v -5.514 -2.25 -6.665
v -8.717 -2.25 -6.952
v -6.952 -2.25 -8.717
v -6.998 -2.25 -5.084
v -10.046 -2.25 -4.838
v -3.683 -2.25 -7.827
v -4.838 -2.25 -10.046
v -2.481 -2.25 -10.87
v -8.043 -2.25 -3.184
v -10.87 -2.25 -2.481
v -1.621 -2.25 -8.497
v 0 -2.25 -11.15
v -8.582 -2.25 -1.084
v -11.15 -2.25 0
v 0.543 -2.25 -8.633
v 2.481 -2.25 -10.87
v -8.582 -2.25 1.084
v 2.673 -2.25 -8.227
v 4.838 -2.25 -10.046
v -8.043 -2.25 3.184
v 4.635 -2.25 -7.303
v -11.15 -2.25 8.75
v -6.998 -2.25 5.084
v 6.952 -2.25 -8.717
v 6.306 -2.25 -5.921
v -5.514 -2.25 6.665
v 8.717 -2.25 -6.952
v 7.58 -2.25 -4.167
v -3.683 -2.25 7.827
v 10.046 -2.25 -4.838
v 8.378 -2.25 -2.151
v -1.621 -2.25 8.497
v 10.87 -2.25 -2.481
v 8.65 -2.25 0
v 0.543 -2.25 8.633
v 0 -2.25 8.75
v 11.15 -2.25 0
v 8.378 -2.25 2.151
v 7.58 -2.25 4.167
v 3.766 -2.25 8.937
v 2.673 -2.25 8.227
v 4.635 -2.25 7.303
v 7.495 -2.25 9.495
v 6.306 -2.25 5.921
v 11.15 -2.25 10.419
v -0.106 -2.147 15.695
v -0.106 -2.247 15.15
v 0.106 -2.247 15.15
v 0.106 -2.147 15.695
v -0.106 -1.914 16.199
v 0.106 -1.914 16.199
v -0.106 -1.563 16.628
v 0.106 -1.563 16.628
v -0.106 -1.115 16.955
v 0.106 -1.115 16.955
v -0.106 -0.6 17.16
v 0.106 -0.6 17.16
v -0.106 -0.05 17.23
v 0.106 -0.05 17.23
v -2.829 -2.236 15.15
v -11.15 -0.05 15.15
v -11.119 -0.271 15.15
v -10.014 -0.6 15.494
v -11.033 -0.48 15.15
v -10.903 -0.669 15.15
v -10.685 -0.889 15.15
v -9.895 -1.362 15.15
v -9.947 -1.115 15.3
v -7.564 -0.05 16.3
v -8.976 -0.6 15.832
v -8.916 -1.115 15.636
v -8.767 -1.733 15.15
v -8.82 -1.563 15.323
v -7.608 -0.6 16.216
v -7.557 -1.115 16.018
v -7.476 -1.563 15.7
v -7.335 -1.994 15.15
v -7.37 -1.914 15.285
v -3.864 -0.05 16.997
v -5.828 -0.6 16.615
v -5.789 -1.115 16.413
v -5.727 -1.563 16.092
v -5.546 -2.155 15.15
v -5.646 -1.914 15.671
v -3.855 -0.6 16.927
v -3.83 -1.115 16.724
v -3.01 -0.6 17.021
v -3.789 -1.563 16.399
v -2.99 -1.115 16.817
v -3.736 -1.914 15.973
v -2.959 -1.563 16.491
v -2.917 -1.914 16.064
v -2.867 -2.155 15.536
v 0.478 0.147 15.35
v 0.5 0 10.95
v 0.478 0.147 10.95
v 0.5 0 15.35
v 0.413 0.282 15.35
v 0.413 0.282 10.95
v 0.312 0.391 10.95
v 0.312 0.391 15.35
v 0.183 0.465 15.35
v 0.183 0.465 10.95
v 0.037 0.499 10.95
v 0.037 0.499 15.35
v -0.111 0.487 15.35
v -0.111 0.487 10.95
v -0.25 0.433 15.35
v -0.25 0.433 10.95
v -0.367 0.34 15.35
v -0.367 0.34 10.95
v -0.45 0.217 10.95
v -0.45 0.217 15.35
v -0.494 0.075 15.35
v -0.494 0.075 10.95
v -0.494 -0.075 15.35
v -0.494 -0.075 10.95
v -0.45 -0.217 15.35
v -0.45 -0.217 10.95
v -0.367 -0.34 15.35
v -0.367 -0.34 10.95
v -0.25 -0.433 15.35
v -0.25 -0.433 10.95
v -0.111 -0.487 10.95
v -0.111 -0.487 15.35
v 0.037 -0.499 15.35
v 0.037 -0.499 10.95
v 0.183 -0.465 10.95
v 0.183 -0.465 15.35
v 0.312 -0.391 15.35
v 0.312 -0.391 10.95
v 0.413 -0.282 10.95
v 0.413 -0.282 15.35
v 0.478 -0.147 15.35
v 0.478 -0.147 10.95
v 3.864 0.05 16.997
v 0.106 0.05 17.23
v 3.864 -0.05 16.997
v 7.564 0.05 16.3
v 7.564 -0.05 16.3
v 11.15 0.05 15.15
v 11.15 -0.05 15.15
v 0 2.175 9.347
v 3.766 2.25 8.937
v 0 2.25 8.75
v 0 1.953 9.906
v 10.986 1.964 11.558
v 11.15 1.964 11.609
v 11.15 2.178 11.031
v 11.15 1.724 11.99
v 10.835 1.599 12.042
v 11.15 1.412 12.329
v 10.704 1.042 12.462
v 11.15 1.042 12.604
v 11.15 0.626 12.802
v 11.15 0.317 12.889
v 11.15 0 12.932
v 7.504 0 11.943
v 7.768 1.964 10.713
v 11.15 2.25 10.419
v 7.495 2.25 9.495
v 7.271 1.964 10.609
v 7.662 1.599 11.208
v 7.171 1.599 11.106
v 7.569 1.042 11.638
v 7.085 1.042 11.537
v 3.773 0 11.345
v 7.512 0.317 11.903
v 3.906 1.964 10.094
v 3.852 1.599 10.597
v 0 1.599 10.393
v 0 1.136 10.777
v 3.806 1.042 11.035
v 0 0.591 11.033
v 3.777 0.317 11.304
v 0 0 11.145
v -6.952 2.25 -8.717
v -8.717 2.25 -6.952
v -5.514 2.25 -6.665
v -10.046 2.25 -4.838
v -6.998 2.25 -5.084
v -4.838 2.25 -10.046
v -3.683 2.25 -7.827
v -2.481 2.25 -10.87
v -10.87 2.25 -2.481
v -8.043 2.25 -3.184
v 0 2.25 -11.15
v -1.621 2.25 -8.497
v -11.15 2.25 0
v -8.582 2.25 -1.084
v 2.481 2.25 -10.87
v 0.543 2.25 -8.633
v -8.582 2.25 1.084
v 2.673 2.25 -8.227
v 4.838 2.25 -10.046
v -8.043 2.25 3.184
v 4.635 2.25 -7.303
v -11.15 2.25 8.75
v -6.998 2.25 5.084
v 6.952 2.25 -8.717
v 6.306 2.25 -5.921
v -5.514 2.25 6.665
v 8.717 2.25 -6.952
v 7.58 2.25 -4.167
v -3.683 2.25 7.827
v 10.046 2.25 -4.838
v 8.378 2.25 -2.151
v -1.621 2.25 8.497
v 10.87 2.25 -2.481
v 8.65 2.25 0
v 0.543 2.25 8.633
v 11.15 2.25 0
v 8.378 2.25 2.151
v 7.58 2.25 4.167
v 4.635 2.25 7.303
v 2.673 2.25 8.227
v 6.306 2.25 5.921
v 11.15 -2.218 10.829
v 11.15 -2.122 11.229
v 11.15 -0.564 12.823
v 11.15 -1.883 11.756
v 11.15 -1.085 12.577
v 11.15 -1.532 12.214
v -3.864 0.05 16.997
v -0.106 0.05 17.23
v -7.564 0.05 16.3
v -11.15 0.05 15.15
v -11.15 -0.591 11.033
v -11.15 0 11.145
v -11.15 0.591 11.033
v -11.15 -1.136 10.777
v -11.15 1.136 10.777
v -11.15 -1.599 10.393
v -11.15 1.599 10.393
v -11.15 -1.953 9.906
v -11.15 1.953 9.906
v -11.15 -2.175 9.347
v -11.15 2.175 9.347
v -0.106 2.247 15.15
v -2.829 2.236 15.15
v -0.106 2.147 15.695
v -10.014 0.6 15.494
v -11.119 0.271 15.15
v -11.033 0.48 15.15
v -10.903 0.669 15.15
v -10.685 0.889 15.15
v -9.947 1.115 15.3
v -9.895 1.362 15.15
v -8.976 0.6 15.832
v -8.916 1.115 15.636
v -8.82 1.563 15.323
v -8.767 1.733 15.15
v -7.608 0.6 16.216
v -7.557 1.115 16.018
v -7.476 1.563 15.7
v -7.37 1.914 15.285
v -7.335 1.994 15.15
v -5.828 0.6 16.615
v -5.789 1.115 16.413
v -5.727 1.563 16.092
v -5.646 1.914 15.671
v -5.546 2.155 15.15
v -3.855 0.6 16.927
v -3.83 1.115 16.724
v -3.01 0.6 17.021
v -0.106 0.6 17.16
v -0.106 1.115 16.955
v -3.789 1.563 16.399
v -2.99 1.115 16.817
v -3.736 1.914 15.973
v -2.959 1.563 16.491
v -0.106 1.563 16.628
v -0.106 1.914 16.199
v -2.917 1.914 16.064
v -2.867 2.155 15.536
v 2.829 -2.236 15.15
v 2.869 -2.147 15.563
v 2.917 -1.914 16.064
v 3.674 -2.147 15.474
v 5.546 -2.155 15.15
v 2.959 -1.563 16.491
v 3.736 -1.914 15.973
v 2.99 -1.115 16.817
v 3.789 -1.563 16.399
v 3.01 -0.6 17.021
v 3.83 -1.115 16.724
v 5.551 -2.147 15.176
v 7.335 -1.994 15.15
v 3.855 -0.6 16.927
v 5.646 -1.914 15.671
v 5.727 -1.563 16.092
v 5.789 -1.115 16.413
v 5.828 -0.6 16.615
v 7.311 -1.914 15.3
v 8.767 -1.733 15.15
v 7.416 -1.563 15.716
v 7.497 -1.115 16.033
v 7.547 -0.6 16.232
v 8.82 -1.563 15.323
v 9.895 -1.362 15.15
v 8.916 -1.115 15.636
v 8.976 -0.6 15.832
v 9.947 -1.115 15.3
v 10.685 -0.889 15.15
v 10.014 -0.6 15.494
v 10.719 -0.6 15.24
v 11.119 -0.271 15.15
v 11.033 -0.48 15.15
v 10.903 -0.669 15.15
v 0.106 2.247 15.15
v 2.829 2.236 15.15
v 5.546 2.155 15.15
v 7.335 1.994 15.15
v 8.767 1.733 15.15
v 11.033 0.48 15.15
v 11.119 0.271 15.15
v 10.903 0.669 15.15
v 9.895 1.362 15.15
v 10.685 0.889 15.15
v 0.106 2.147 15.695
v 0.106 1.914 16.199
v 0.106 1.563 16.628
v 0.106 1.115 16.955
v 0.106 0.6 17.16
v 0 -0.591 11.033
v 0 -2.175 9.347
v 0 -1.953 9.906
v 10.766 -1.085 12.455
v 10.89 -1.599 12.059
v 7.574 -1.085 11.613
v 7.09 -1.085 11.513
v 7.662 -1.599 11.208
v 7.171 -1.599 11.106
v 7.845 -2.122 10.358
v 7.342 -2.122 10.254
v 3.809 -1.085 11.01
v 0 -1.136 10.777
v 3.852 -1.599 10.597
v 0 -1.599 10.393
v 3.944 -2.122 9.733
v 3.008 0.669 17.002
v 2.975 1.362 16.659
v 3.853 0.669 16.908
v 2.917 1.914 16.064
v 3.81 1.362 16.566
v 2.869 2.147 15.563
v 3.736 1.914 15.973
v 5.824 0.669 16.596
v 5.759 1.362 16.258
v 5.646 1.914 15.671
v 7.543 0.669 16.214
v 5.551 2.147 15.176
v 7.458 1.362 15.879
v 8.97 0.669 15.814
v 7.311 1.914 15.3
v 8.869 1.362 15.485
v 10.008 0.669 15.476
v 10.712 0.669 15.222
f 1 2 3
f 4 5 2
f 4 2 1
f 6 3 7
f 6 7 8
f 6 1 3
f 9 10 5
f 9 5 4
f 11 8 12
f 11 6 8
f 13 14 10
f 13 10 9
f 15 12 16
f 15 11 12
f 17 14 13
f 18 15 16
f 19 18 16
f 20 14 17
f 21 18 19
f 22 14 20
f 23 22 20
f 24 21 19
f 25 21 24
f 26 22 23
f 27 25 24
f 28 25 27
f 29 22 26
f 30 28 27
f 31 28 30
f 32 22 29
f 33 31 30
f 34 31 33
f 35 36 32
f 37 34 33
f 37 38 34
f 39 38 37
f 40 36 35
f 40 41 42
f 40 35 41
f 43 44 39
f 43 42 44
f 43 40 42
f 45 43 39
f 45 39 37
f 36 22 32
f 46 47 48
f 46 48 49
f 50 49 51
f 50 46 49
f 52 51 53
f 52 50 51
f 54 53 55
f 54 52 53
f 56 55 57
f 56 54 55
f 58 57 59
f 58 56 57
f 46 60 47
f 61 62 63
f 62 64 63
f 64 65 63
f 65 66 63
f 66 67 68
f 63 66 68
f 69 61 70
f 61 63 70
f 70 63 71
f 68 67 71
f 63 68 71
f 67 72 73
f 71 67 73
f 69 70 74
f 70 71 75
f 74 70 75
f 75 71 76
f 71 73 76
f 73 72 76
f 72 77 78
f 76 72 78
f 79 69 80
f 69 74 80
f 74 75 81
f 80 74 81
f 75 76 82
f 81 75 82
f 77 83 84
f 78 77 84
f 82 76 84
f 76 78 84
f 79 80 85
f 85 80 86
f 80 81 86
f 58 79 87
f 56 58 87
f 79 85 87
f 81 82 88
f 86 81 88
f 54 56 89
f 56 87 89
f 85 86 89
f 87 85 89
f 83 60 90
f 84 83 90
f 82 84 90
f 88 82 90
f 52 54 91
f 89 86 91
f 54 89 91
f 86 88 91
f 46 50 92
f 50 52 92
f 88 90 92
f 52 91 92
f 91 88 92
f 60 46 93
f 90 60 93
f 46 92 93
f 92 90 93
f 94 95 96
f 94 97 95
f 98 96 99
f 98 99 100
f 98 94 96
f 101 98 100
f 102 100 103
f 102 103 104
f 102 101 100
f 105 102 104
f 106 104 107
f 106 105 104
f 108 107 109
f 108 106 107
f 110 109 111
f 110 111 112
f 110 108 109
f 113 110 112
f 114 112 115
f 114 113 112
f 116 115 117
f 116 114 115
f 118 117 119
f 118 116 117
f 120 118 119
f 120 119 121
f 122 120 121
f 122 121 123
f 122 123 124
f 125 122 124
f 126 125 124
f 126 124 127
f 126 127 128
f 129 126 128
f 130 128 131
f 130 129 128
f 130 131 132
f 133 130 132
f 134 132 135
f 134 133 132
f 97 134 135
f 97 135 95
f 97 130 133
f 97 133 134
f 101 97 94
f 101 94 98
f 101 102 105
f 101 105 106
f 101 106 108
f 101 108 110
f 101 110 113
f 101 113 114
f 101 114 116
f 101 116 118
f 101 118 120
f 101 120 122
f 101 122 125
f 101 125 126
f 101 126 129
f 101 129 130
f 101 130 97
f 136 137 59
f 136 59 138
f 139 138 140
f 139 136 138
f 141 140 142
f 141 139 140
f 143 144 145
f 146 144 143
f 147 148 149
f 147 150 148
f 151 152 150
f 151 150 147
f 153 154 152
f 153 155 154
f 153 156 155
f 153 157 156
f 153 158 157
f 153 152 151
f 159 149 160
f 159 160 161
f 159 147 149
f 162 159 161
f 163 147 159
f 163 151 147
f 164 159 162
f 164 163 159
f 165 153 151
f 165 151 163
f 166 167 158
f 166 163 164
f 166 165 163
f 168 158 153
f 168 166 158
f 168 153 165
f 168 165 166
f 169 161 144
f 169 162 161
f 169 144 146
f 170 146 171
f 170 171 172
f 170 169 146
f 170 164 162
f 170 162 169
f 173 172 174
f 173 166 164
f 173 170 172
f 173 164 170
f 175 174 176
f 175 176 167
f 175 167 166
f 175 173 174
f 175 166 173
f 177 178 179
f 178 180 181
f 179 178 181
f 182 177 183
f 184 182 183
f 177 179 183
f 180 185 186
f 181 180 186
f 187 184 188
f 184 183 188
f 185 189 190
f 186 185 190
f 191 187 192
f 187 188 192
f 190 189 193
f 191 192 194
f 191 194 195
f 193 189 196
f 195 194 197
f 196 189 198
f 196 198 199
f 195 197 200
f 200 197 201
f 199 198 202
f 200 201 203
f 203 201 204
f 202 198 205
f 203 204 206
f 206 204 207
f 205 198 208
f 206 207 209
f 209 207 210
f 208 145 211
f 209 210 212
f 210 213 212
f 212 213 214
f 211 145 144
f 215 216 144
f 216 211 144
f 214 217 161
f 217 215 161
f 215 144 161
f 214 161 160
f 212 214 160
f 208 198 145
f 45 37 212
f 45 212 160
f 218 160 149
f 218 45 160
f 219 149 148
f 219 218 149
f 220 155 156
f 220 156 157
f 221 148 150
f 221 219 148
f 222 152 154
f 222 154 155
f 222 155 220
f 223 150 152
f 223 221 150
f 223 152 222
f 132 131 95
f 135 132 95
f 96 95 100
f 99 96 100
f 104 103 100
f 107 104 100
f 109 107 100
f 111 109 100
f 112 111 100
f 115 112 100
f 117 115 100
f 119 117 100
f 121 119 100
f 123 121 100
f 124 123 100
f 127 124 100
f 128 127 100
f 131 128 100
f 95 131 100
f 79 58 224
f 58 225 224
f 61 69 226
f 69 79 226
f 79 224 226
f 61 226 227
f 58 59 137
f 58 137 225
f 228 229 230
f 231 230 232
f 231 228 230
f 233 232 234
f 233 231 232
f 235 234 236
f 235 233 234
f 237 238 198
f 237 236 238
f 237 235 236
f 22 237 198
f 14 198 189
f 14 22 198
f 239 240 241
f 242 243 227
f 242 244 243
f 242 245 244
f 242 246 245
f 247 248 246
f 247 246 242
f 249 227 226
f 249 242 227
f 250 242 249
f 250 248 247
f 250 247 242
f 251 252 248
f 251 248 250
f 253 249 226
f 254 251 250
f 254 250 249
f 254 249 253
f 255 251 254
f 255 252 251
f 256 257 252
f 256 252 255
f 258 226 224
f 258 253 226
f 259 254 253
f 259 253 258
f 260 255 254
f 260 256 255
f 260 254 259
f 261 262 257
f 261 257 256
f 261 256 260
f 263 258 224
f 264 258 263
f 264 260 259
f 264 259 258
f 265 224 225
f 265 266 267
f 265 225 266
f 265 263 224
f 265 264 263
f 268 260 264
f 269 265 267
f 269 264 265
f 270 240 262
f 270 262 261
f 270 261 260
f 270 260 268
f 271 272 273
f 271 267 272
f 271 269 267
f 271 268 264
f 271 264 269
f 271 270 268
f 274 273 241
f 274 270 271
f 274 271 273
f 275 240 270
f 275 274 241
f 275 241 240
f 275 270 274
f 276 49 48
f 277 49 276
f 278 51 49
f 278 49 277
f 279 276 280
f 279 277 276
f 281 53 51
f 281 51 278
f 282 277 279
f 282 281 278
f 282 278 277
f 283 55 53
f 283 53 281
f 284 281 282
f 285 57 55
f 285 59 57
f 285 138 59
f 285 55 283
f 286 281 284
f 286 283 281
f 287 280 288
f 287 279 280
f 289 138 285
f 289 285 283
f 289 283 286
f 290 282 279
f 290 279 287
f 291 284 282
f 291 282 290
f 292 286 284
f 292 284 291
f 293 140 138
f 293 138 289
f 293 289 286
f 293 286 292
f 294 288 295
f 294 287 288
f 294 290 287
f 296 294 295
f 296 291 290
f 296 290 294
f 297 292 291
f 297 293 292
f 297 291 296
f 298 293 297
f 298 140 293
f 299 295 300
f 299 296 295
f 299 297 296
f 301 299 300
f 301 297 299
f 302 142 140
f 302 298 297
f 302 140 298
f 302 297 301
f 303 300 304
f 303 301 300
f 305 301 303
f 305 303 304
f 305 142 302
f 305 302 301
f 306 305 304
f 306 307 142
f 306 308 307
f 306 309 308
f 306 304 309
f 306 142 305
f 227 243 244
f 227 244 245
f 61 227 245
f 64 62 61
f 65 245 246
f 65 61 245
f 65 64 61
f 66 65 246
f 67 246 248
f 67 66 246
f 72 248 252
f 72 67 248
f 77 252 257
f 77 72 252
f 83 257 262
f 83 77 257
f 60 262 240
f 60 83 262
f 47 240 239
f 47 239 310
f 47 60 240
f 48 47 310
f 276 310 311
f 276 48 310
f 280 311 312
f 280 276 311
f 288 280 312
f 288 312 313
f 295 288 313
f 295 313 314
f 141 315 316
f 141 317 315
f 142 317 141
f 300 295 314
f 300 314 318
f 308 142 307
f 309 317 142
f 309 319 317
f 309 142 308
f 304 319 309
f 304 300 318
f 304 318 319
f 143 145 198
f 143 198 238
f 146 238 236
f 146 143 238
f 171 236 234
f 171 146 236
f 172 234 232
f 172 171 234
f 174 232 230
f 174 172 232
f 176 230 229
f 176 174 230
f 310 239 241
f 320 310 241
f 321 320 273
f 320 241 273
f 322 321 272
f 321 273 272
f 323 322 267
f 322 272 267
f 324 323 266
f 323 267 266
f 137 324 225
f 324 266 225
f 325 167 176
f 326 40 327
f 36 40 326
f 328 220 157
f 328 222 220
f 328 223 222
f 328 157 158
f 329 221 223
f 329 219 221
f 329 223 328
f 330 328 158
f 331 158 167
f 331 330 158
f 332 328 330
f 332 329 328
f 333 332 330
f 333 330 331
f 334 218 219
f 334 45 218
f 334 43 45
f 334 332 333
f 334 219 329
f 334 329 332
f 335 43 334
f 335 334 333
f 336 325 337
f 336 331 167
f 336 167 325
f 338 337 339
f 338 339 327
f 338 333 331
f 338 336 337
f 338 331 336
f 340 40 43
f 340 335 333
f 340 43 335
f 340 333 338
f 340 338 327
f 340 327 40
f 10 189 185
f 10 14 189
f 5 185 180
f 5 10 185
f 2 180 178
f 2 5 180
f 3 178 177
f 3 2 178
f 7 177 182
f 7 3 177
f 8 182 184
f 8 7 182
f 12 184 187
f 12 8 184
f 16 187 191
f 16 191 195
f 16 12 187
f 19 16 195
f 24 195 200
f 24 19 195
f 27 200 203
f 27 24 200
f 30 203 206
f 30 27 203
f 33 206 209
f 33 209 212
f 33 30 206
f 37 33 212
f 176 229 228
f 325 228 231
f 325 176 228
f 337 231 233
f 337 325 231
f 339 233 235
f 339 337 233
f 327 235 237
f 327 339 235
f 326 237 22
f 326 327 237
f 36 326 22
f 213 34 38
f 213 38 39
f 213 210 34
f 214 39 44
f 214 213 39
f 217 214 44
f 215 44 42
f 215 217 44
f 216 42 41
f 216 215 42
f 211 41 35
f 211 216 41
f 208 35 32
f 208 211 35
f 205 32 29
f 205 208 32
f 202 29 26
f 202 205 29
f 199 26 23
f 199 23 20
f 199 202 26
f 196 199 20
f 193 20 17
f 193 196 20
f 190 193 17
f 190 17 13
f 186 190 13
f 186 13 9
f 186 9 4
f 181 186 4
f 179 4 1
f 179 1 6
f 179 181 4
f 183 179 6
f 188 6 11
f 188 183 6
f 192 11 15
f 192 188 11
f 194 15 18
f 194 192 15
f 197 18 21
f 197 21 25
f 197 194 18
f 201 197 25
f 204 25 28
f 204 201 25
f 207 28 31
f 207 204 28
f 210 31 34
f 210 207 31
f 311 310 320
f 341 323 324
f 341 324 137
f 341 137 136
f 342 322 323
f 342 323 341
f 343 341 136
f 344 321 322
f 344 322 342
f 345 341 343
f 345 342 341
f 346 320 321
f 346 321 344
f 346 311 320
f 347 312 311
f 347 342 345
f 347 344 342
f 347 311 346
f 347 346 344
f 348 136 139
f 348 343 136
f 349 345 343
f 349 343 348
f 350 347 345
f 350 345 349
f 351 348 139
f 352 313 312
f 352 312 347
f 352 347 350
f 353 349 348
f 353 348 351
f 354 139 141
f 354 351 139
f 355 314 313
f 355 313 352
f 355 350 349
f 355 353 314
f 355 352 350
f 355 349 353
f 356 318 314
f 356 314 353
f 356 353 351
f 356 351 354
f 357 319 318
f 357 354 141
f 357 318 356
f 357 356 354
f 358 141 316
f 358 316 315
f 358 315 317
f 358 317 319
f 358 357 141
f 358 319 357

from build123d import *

# Parameters (mm, degrees)
F0_R          = 8.65
F1_DEPTH      = 2.25
F1_DEPTH_BACK = 2.25
F5_T1_DEPTH   = 59.7206593681
F6_T1_DEPTH   = 0.2117362528
F6_T4_ANGLE   = 31.7141074843
F6_T6_ANGLE   = 31.7141074843
F6_T8_ANGLE   = 31.7141074843
F6_T10_ANGLE  = 31.7141074843
F7_T3_DEPTH   = 17.15
F7_T6_DEPTH   = 17.15
F7_T9_ANGLE   = 27.8482361684
F7_T12_ANGLE  = 27.8482361684
F8_R          = 0.5
F9_DEPTH      = 2.2
F9_DEPTH_BACK = 2.2


# Not quite as in the source:
# - a fillet or chamfer that OpenCascade refuses, or shapes differently, is made with other operations: its cross-section is extruded or revolved along the edge and cut away or added
# - the program builds the solid bodies; features that only make, move or delete a surface that nothing else refers to are left out


with BuildPart() as f1:
    # F0 (on Front) → F1 (new body, two sides)
    with BuildSketch(Plane.XZ) as f1_sk:
        with BuildLine():
            ThreePointArc((-11.15, 0), (0, -11.15), (11.15, 0))
            ThreePointArc((11.15, 0), (7.8842406102, 7.8842406102), (0, 11.15))
            ThreePointArc((0, 11.15), (-7.8842406102, 7.8842406102), (-11.15, 0))
        make_face()
        Circle(F0_R, mode=Mode.SUBTRACT)
        with BuildLine():
            ThreePointArc((-11.15, 0), (-7.8842406102, 7.8842406102), (0, 11.15))
            Line((0, 11.15), (-4, 11.15))
            Line((-4, 11.15), (-9.15, 11.15))
            Line((-9.15, 11.15), (-11.15, 11.15))
            Line((-11.15, 11.15), (-11.15, 0))
        make_face()
        with BuildLine():
            ThreePointArc((0, 11.15), (7.8842406102, 7.8842406102), (11.15, 0))
            Line((11.15, 0), (11.15, 11.15))
            Line((11.15, 11.15), (0, 11.15))
        make_face()
        with BuildLine():
            ThreePointArc((11.15, 12.9371443763), (5.6461576541, 11.5996193357), (0, 11.15))
            Line((0, 11.15), (11.15, 11.15))
            Line((11.15, 11.15), (11.15, 12.9371443763))
        make_face()
    extrude(amount=F1_DEPTH)
    extrude(f1_sk.sketch, amount=-F1_DEPTH_BACK)

    # F7: fillet of radius 2.4 on 2 edges, made by hand


with BuildPart() as f1b:
    # F0 (on Front) → F1, piece 2 (new body, two sides)
    with BuildSketch(Plane.XZ) as f1_2_sk:
        Polygon((-9.15, 15.15), (-4, 15.15), (0, 15.15), (11.15, 15.15), (11.15, 17.2301754355), (-11.15, 17.2301754355), (-11.15, 15.15), align=None)
    extrude(amount=F1_DEPTH)
    extrude(f1_2_sk.sketch, amount=-F1_DEPTH_BACK)

    # F5: fillet of radius 30.3580112828 on 2 edges, made by hand

    # F5_s2 → F5_t1 (cut)
    with BuildSketch(Plane.XZ.offset(-29.8603296841)):
        with BuildLine():
            ThreePointArc((-0.1058681264, 17.2301754355), (-5.725031291, 16.7055993283), (-11.15, 15.15))
            Line((-11.15, 15.15), (-11.3708826375, 15.7155567169))
            ThreePointArc((-11.3708826375, 15.7155567169), (-11.7571602257, 16.1900877178), (-11.7571602257, 17.2301754355))
            Line((-11.7571602257, 17.2301754355), (-11.15, 17.8373356612))
            Line((-11.15, 17.8373356612), (-0.1058681264, 17.8373356612))
            Line((-0.1058681264, 17.8373356612), (-0.1058681264, 17.2301754355))
        make_face()
        with BuildLine():
            ThreePointArc((0.1058681264, 17.2301754355), (5.725031291, 16.7055993283), (11.15, 15.15))
            Line((11.15, 15.15), (11.3708826375, 15.7155567169))
            ThreePointArc((11.3708826375, 15.7155567169), (11.7571602257, 16.1900877178), (11.7571602257, 17.2301754355))
            Line((11.7571602257, 17.2301754355), (11.15, 17.8373356612))
            Line((11.15, 17.8373356612), (0.1058681264, 17.8373356612))
            Line((0.1058681264, 17.8373356612), (0.1058681264, 17.2301754355))
        make_face()
    extrude(amount=F5_T1_DEPTH, mode=Mode.SUBTRACT)

    # F6: fillet of radius 2.2 on 2 edges, made by hand

    # F6_s2 → F6_t1 (cut)
    with BuildSketch(Plane.YZ.offset(-0.1058681264)):
        with BuildLine():
            ThreePointArc((2.25, 15.0301754355), (1.6056349186, 16.5858103542), (0.05, 17.2301754355))
            Line((0.05, 17.2301754355), (2.25, 17.2301754355))
            Line((2.25, 17.2301754355), (2.25, 15.0301754355))
        make_face()
        with BuildLine():
            ThreePointArc((-2.25, 15.0301754355), (-1.6056349186, 16.5858103542), (-0.05, 17.2301754355))
            Line((-0.05, 17.2301754355), (-2.25, 17.2301754355))
            Line((-2.25, 17.2301754355), (-2.25, 15.0301754355))
        make_face()
    extrude(amount=F6_T1_DEPTH, mode=Mode.SUBTRACT)

    # F6_s3 → F6_t4 (revolve, cut)
    with BuildSketch(Plane(origin=(-5.9472140901, 0, -3.6750974915), x_dir=(0, 1, 0), z_dir=(-0.8506817009, 0, -0.5256811236))):
        with BuildLine():
            ThreePointArc((-0.05, -19.2460544304), (-1.6056349186, -18.601689349), (-2.25, -17.0460544304))
            Line((-2.25, -17.0460544304), (-2.25, -19.2460544304))
            Line((-2.25, -19.2460544304), (-0.05, -19.2460544304))
        make_face()
    revolve(axis=Axis((-0.1058681264, -2.25, -13.1278358476), (0, 1, 0)), revolution_arc=F6_T4_ANGLE, mode=Mode.SUBTRACT)

    # F6_s5 → F6_t6 (revolve, cut)
    with BuildSketch(Plane.YZ.offset(0.1058681264)):
        with BuildLine():
            ThreePointArc((0.05, 17.2301754355), (1.6056349186, 16.5858103541), (2.25, 15.0301754355))
            Line((2.25, 15.0301754355), (2.25, 17.2301754355))
            Line((2.25, 17.2301754355), (0.05, 17.2301754355))
        make_face()
    revolve(axis=Axis((0.1058681264, 2.25, -13.1278358476), (0, 1, 0)), revolution_arc=F6_T6_ANGLE, mode=Mode.SUBTRACT)

    # F6_s7 → F6_t8 (revolve, cut)
    with BuildSketch(Plane(origin=(-5.9472140901, 0, -3.6750974915), x_dir=(0, 1, 0), z_dir=(-0.8506817009, 0, -0.5256811236))):
        with BuildLine():
            ThreePointArc((0.05, -19.2460544304), (1.6056349186, -18.601689349), (2.25, -17.0460544304))
            Line((2.25, -17.0460544304), (2.25, -19.2460544304))
            Line((2.25, -19.2460544304), (0.05, -19.2460544304))
        make_face()
    revolve(axis=Axis((-0.1058681264, 2.25, -13.1278358476), (0, 1, 0)), revolution_arc=F6_T8_ANGLE, mode=Mode.SUBTRACT)

    # F6_s9 → F6_t10 (revolve, cut)
    with BuildSketch(Plane.YZ.offset(0.1058681264)):
        with BuildLine():
            ThreePointArc((-2.25, 15.0301754355), (-1.6056349186, 16.5858103541), (-0.05, 17.2301754355))
            Line((-0.05, 17.2301754355), (-2.25, 17.2301754355))
            Line((-2.25, 17.2301754355), (-2.25, 15.0301754355))
        make_face()
    revolve(axis=Axis((0.1058681264, -2.25, -13.1278358476), (0, 1, 0)), revolution_arc=F6_T10_ANGLE, mode=Mode.SUBTRACT)


with BuildPart() as f7_tool1:
    # F7_s2 → F7_t3 (new body)
    with BuildSketch(Plane.YZ):
        with BuildLine():
            ThreePointArc((0.15, 11.15), (-1.5470562748, 10.4470562748), (-2.25, 8.75))
            Line((-2.25, 8.75), (-2.25, 11.15))
            Line((-2.25, 11.15), (0.15, 11.15))
        make_face()
    extrude(amount=-F7_T3_DEPTH)


with BuildPart() as f7_tool4:
    # F7_s5 → F7_t6 (new body)
    with BuildSketch(Plane.YZ):
        with BuildLine():
            ThreePointArc((2.25, 8.75), (1.5470562748, 10.4470562748), (-0.15, 11.15))
            Line((-0.15, 11.15), (2.25, 11.15))
            Line((2.25, 11.15), (2.25, 8.75))
        make_face()
    extrude(amount=-F7_T6_DEPTH)


with BuildPart() as f7_tool7:
    # F7_s8 → F7_t9 (revolve)
    with BuildSketch(Plane(origin=(19.3406338701, 0, 10.217977433), x_dir=(0, 1, 0), z_dir=(0.8841880202, 0, 0.467131186))):
        with BuildLine():
            ThreePointArc((2.25, 3.3269863074), (1.5470562748, 5.0240425823), (-0.15, 5.7269863074))
            Line((-0.15, 5.7269863074), (2.25, 5.7269863074))
            Line((2.25, 5.7269863074), (2.25, 3.3269863074))
        make_face()
    revolve(axis=Axis((0, 2.25, 46.8260166415), (0, 1, 0)), revolution_arc=F7_T9_ANGLE)


with BuildPart() as f7_tool10:
    # F7_s11 → F7_t12 (revolve)
    with BuildSketch(Plane(origin=(19.3406338701, 0, 10.217977433), x_dir=(0, 1, 0), z_dir=(0.8841880202, 0, 0.467131186))):
        with BuildLine():
            ThreePointArc((0.15, 5.7269863074), (-1.5470562748, 5.0240425823), (-2.25, 3.3269863074))
            Line((-2.25, 3.3269863074), (-2.25, 5.7269863074))
            Line((-2.25, 5.7269863074), (0.15, 5.7269863074))
        make_face()
    revolve(axis=Axis((0, -2.25, 46.8260166415), (0, 1, 0)), revolution_arc=F7_T12_ANGLE)


with BuildPart() as f1_1:
    add(f1.part)

    # F7_t13: cut F7_tool1, F7_tool4, F7_tool7, F7_tool10
    add([f7_tool1.part, f7_tool4.part, f7_tool7.part, f7_tool10.part], mode=Mode.SUBTRACT)


with BuildPart() as f9:
    # F8 (on offset) → F9 (new body, two sides)
    with BuildSketch(Plane.XY.offset(13.15)) as f9_sk:
        Circle(F8_R)
    extrude(amount=F9_DEPTH)
    extrude(f9_sk.sketch, amount=-F9_DEPTH_BACK)


solid = Compound([f1b.part, f1_1.part, f9.part])
